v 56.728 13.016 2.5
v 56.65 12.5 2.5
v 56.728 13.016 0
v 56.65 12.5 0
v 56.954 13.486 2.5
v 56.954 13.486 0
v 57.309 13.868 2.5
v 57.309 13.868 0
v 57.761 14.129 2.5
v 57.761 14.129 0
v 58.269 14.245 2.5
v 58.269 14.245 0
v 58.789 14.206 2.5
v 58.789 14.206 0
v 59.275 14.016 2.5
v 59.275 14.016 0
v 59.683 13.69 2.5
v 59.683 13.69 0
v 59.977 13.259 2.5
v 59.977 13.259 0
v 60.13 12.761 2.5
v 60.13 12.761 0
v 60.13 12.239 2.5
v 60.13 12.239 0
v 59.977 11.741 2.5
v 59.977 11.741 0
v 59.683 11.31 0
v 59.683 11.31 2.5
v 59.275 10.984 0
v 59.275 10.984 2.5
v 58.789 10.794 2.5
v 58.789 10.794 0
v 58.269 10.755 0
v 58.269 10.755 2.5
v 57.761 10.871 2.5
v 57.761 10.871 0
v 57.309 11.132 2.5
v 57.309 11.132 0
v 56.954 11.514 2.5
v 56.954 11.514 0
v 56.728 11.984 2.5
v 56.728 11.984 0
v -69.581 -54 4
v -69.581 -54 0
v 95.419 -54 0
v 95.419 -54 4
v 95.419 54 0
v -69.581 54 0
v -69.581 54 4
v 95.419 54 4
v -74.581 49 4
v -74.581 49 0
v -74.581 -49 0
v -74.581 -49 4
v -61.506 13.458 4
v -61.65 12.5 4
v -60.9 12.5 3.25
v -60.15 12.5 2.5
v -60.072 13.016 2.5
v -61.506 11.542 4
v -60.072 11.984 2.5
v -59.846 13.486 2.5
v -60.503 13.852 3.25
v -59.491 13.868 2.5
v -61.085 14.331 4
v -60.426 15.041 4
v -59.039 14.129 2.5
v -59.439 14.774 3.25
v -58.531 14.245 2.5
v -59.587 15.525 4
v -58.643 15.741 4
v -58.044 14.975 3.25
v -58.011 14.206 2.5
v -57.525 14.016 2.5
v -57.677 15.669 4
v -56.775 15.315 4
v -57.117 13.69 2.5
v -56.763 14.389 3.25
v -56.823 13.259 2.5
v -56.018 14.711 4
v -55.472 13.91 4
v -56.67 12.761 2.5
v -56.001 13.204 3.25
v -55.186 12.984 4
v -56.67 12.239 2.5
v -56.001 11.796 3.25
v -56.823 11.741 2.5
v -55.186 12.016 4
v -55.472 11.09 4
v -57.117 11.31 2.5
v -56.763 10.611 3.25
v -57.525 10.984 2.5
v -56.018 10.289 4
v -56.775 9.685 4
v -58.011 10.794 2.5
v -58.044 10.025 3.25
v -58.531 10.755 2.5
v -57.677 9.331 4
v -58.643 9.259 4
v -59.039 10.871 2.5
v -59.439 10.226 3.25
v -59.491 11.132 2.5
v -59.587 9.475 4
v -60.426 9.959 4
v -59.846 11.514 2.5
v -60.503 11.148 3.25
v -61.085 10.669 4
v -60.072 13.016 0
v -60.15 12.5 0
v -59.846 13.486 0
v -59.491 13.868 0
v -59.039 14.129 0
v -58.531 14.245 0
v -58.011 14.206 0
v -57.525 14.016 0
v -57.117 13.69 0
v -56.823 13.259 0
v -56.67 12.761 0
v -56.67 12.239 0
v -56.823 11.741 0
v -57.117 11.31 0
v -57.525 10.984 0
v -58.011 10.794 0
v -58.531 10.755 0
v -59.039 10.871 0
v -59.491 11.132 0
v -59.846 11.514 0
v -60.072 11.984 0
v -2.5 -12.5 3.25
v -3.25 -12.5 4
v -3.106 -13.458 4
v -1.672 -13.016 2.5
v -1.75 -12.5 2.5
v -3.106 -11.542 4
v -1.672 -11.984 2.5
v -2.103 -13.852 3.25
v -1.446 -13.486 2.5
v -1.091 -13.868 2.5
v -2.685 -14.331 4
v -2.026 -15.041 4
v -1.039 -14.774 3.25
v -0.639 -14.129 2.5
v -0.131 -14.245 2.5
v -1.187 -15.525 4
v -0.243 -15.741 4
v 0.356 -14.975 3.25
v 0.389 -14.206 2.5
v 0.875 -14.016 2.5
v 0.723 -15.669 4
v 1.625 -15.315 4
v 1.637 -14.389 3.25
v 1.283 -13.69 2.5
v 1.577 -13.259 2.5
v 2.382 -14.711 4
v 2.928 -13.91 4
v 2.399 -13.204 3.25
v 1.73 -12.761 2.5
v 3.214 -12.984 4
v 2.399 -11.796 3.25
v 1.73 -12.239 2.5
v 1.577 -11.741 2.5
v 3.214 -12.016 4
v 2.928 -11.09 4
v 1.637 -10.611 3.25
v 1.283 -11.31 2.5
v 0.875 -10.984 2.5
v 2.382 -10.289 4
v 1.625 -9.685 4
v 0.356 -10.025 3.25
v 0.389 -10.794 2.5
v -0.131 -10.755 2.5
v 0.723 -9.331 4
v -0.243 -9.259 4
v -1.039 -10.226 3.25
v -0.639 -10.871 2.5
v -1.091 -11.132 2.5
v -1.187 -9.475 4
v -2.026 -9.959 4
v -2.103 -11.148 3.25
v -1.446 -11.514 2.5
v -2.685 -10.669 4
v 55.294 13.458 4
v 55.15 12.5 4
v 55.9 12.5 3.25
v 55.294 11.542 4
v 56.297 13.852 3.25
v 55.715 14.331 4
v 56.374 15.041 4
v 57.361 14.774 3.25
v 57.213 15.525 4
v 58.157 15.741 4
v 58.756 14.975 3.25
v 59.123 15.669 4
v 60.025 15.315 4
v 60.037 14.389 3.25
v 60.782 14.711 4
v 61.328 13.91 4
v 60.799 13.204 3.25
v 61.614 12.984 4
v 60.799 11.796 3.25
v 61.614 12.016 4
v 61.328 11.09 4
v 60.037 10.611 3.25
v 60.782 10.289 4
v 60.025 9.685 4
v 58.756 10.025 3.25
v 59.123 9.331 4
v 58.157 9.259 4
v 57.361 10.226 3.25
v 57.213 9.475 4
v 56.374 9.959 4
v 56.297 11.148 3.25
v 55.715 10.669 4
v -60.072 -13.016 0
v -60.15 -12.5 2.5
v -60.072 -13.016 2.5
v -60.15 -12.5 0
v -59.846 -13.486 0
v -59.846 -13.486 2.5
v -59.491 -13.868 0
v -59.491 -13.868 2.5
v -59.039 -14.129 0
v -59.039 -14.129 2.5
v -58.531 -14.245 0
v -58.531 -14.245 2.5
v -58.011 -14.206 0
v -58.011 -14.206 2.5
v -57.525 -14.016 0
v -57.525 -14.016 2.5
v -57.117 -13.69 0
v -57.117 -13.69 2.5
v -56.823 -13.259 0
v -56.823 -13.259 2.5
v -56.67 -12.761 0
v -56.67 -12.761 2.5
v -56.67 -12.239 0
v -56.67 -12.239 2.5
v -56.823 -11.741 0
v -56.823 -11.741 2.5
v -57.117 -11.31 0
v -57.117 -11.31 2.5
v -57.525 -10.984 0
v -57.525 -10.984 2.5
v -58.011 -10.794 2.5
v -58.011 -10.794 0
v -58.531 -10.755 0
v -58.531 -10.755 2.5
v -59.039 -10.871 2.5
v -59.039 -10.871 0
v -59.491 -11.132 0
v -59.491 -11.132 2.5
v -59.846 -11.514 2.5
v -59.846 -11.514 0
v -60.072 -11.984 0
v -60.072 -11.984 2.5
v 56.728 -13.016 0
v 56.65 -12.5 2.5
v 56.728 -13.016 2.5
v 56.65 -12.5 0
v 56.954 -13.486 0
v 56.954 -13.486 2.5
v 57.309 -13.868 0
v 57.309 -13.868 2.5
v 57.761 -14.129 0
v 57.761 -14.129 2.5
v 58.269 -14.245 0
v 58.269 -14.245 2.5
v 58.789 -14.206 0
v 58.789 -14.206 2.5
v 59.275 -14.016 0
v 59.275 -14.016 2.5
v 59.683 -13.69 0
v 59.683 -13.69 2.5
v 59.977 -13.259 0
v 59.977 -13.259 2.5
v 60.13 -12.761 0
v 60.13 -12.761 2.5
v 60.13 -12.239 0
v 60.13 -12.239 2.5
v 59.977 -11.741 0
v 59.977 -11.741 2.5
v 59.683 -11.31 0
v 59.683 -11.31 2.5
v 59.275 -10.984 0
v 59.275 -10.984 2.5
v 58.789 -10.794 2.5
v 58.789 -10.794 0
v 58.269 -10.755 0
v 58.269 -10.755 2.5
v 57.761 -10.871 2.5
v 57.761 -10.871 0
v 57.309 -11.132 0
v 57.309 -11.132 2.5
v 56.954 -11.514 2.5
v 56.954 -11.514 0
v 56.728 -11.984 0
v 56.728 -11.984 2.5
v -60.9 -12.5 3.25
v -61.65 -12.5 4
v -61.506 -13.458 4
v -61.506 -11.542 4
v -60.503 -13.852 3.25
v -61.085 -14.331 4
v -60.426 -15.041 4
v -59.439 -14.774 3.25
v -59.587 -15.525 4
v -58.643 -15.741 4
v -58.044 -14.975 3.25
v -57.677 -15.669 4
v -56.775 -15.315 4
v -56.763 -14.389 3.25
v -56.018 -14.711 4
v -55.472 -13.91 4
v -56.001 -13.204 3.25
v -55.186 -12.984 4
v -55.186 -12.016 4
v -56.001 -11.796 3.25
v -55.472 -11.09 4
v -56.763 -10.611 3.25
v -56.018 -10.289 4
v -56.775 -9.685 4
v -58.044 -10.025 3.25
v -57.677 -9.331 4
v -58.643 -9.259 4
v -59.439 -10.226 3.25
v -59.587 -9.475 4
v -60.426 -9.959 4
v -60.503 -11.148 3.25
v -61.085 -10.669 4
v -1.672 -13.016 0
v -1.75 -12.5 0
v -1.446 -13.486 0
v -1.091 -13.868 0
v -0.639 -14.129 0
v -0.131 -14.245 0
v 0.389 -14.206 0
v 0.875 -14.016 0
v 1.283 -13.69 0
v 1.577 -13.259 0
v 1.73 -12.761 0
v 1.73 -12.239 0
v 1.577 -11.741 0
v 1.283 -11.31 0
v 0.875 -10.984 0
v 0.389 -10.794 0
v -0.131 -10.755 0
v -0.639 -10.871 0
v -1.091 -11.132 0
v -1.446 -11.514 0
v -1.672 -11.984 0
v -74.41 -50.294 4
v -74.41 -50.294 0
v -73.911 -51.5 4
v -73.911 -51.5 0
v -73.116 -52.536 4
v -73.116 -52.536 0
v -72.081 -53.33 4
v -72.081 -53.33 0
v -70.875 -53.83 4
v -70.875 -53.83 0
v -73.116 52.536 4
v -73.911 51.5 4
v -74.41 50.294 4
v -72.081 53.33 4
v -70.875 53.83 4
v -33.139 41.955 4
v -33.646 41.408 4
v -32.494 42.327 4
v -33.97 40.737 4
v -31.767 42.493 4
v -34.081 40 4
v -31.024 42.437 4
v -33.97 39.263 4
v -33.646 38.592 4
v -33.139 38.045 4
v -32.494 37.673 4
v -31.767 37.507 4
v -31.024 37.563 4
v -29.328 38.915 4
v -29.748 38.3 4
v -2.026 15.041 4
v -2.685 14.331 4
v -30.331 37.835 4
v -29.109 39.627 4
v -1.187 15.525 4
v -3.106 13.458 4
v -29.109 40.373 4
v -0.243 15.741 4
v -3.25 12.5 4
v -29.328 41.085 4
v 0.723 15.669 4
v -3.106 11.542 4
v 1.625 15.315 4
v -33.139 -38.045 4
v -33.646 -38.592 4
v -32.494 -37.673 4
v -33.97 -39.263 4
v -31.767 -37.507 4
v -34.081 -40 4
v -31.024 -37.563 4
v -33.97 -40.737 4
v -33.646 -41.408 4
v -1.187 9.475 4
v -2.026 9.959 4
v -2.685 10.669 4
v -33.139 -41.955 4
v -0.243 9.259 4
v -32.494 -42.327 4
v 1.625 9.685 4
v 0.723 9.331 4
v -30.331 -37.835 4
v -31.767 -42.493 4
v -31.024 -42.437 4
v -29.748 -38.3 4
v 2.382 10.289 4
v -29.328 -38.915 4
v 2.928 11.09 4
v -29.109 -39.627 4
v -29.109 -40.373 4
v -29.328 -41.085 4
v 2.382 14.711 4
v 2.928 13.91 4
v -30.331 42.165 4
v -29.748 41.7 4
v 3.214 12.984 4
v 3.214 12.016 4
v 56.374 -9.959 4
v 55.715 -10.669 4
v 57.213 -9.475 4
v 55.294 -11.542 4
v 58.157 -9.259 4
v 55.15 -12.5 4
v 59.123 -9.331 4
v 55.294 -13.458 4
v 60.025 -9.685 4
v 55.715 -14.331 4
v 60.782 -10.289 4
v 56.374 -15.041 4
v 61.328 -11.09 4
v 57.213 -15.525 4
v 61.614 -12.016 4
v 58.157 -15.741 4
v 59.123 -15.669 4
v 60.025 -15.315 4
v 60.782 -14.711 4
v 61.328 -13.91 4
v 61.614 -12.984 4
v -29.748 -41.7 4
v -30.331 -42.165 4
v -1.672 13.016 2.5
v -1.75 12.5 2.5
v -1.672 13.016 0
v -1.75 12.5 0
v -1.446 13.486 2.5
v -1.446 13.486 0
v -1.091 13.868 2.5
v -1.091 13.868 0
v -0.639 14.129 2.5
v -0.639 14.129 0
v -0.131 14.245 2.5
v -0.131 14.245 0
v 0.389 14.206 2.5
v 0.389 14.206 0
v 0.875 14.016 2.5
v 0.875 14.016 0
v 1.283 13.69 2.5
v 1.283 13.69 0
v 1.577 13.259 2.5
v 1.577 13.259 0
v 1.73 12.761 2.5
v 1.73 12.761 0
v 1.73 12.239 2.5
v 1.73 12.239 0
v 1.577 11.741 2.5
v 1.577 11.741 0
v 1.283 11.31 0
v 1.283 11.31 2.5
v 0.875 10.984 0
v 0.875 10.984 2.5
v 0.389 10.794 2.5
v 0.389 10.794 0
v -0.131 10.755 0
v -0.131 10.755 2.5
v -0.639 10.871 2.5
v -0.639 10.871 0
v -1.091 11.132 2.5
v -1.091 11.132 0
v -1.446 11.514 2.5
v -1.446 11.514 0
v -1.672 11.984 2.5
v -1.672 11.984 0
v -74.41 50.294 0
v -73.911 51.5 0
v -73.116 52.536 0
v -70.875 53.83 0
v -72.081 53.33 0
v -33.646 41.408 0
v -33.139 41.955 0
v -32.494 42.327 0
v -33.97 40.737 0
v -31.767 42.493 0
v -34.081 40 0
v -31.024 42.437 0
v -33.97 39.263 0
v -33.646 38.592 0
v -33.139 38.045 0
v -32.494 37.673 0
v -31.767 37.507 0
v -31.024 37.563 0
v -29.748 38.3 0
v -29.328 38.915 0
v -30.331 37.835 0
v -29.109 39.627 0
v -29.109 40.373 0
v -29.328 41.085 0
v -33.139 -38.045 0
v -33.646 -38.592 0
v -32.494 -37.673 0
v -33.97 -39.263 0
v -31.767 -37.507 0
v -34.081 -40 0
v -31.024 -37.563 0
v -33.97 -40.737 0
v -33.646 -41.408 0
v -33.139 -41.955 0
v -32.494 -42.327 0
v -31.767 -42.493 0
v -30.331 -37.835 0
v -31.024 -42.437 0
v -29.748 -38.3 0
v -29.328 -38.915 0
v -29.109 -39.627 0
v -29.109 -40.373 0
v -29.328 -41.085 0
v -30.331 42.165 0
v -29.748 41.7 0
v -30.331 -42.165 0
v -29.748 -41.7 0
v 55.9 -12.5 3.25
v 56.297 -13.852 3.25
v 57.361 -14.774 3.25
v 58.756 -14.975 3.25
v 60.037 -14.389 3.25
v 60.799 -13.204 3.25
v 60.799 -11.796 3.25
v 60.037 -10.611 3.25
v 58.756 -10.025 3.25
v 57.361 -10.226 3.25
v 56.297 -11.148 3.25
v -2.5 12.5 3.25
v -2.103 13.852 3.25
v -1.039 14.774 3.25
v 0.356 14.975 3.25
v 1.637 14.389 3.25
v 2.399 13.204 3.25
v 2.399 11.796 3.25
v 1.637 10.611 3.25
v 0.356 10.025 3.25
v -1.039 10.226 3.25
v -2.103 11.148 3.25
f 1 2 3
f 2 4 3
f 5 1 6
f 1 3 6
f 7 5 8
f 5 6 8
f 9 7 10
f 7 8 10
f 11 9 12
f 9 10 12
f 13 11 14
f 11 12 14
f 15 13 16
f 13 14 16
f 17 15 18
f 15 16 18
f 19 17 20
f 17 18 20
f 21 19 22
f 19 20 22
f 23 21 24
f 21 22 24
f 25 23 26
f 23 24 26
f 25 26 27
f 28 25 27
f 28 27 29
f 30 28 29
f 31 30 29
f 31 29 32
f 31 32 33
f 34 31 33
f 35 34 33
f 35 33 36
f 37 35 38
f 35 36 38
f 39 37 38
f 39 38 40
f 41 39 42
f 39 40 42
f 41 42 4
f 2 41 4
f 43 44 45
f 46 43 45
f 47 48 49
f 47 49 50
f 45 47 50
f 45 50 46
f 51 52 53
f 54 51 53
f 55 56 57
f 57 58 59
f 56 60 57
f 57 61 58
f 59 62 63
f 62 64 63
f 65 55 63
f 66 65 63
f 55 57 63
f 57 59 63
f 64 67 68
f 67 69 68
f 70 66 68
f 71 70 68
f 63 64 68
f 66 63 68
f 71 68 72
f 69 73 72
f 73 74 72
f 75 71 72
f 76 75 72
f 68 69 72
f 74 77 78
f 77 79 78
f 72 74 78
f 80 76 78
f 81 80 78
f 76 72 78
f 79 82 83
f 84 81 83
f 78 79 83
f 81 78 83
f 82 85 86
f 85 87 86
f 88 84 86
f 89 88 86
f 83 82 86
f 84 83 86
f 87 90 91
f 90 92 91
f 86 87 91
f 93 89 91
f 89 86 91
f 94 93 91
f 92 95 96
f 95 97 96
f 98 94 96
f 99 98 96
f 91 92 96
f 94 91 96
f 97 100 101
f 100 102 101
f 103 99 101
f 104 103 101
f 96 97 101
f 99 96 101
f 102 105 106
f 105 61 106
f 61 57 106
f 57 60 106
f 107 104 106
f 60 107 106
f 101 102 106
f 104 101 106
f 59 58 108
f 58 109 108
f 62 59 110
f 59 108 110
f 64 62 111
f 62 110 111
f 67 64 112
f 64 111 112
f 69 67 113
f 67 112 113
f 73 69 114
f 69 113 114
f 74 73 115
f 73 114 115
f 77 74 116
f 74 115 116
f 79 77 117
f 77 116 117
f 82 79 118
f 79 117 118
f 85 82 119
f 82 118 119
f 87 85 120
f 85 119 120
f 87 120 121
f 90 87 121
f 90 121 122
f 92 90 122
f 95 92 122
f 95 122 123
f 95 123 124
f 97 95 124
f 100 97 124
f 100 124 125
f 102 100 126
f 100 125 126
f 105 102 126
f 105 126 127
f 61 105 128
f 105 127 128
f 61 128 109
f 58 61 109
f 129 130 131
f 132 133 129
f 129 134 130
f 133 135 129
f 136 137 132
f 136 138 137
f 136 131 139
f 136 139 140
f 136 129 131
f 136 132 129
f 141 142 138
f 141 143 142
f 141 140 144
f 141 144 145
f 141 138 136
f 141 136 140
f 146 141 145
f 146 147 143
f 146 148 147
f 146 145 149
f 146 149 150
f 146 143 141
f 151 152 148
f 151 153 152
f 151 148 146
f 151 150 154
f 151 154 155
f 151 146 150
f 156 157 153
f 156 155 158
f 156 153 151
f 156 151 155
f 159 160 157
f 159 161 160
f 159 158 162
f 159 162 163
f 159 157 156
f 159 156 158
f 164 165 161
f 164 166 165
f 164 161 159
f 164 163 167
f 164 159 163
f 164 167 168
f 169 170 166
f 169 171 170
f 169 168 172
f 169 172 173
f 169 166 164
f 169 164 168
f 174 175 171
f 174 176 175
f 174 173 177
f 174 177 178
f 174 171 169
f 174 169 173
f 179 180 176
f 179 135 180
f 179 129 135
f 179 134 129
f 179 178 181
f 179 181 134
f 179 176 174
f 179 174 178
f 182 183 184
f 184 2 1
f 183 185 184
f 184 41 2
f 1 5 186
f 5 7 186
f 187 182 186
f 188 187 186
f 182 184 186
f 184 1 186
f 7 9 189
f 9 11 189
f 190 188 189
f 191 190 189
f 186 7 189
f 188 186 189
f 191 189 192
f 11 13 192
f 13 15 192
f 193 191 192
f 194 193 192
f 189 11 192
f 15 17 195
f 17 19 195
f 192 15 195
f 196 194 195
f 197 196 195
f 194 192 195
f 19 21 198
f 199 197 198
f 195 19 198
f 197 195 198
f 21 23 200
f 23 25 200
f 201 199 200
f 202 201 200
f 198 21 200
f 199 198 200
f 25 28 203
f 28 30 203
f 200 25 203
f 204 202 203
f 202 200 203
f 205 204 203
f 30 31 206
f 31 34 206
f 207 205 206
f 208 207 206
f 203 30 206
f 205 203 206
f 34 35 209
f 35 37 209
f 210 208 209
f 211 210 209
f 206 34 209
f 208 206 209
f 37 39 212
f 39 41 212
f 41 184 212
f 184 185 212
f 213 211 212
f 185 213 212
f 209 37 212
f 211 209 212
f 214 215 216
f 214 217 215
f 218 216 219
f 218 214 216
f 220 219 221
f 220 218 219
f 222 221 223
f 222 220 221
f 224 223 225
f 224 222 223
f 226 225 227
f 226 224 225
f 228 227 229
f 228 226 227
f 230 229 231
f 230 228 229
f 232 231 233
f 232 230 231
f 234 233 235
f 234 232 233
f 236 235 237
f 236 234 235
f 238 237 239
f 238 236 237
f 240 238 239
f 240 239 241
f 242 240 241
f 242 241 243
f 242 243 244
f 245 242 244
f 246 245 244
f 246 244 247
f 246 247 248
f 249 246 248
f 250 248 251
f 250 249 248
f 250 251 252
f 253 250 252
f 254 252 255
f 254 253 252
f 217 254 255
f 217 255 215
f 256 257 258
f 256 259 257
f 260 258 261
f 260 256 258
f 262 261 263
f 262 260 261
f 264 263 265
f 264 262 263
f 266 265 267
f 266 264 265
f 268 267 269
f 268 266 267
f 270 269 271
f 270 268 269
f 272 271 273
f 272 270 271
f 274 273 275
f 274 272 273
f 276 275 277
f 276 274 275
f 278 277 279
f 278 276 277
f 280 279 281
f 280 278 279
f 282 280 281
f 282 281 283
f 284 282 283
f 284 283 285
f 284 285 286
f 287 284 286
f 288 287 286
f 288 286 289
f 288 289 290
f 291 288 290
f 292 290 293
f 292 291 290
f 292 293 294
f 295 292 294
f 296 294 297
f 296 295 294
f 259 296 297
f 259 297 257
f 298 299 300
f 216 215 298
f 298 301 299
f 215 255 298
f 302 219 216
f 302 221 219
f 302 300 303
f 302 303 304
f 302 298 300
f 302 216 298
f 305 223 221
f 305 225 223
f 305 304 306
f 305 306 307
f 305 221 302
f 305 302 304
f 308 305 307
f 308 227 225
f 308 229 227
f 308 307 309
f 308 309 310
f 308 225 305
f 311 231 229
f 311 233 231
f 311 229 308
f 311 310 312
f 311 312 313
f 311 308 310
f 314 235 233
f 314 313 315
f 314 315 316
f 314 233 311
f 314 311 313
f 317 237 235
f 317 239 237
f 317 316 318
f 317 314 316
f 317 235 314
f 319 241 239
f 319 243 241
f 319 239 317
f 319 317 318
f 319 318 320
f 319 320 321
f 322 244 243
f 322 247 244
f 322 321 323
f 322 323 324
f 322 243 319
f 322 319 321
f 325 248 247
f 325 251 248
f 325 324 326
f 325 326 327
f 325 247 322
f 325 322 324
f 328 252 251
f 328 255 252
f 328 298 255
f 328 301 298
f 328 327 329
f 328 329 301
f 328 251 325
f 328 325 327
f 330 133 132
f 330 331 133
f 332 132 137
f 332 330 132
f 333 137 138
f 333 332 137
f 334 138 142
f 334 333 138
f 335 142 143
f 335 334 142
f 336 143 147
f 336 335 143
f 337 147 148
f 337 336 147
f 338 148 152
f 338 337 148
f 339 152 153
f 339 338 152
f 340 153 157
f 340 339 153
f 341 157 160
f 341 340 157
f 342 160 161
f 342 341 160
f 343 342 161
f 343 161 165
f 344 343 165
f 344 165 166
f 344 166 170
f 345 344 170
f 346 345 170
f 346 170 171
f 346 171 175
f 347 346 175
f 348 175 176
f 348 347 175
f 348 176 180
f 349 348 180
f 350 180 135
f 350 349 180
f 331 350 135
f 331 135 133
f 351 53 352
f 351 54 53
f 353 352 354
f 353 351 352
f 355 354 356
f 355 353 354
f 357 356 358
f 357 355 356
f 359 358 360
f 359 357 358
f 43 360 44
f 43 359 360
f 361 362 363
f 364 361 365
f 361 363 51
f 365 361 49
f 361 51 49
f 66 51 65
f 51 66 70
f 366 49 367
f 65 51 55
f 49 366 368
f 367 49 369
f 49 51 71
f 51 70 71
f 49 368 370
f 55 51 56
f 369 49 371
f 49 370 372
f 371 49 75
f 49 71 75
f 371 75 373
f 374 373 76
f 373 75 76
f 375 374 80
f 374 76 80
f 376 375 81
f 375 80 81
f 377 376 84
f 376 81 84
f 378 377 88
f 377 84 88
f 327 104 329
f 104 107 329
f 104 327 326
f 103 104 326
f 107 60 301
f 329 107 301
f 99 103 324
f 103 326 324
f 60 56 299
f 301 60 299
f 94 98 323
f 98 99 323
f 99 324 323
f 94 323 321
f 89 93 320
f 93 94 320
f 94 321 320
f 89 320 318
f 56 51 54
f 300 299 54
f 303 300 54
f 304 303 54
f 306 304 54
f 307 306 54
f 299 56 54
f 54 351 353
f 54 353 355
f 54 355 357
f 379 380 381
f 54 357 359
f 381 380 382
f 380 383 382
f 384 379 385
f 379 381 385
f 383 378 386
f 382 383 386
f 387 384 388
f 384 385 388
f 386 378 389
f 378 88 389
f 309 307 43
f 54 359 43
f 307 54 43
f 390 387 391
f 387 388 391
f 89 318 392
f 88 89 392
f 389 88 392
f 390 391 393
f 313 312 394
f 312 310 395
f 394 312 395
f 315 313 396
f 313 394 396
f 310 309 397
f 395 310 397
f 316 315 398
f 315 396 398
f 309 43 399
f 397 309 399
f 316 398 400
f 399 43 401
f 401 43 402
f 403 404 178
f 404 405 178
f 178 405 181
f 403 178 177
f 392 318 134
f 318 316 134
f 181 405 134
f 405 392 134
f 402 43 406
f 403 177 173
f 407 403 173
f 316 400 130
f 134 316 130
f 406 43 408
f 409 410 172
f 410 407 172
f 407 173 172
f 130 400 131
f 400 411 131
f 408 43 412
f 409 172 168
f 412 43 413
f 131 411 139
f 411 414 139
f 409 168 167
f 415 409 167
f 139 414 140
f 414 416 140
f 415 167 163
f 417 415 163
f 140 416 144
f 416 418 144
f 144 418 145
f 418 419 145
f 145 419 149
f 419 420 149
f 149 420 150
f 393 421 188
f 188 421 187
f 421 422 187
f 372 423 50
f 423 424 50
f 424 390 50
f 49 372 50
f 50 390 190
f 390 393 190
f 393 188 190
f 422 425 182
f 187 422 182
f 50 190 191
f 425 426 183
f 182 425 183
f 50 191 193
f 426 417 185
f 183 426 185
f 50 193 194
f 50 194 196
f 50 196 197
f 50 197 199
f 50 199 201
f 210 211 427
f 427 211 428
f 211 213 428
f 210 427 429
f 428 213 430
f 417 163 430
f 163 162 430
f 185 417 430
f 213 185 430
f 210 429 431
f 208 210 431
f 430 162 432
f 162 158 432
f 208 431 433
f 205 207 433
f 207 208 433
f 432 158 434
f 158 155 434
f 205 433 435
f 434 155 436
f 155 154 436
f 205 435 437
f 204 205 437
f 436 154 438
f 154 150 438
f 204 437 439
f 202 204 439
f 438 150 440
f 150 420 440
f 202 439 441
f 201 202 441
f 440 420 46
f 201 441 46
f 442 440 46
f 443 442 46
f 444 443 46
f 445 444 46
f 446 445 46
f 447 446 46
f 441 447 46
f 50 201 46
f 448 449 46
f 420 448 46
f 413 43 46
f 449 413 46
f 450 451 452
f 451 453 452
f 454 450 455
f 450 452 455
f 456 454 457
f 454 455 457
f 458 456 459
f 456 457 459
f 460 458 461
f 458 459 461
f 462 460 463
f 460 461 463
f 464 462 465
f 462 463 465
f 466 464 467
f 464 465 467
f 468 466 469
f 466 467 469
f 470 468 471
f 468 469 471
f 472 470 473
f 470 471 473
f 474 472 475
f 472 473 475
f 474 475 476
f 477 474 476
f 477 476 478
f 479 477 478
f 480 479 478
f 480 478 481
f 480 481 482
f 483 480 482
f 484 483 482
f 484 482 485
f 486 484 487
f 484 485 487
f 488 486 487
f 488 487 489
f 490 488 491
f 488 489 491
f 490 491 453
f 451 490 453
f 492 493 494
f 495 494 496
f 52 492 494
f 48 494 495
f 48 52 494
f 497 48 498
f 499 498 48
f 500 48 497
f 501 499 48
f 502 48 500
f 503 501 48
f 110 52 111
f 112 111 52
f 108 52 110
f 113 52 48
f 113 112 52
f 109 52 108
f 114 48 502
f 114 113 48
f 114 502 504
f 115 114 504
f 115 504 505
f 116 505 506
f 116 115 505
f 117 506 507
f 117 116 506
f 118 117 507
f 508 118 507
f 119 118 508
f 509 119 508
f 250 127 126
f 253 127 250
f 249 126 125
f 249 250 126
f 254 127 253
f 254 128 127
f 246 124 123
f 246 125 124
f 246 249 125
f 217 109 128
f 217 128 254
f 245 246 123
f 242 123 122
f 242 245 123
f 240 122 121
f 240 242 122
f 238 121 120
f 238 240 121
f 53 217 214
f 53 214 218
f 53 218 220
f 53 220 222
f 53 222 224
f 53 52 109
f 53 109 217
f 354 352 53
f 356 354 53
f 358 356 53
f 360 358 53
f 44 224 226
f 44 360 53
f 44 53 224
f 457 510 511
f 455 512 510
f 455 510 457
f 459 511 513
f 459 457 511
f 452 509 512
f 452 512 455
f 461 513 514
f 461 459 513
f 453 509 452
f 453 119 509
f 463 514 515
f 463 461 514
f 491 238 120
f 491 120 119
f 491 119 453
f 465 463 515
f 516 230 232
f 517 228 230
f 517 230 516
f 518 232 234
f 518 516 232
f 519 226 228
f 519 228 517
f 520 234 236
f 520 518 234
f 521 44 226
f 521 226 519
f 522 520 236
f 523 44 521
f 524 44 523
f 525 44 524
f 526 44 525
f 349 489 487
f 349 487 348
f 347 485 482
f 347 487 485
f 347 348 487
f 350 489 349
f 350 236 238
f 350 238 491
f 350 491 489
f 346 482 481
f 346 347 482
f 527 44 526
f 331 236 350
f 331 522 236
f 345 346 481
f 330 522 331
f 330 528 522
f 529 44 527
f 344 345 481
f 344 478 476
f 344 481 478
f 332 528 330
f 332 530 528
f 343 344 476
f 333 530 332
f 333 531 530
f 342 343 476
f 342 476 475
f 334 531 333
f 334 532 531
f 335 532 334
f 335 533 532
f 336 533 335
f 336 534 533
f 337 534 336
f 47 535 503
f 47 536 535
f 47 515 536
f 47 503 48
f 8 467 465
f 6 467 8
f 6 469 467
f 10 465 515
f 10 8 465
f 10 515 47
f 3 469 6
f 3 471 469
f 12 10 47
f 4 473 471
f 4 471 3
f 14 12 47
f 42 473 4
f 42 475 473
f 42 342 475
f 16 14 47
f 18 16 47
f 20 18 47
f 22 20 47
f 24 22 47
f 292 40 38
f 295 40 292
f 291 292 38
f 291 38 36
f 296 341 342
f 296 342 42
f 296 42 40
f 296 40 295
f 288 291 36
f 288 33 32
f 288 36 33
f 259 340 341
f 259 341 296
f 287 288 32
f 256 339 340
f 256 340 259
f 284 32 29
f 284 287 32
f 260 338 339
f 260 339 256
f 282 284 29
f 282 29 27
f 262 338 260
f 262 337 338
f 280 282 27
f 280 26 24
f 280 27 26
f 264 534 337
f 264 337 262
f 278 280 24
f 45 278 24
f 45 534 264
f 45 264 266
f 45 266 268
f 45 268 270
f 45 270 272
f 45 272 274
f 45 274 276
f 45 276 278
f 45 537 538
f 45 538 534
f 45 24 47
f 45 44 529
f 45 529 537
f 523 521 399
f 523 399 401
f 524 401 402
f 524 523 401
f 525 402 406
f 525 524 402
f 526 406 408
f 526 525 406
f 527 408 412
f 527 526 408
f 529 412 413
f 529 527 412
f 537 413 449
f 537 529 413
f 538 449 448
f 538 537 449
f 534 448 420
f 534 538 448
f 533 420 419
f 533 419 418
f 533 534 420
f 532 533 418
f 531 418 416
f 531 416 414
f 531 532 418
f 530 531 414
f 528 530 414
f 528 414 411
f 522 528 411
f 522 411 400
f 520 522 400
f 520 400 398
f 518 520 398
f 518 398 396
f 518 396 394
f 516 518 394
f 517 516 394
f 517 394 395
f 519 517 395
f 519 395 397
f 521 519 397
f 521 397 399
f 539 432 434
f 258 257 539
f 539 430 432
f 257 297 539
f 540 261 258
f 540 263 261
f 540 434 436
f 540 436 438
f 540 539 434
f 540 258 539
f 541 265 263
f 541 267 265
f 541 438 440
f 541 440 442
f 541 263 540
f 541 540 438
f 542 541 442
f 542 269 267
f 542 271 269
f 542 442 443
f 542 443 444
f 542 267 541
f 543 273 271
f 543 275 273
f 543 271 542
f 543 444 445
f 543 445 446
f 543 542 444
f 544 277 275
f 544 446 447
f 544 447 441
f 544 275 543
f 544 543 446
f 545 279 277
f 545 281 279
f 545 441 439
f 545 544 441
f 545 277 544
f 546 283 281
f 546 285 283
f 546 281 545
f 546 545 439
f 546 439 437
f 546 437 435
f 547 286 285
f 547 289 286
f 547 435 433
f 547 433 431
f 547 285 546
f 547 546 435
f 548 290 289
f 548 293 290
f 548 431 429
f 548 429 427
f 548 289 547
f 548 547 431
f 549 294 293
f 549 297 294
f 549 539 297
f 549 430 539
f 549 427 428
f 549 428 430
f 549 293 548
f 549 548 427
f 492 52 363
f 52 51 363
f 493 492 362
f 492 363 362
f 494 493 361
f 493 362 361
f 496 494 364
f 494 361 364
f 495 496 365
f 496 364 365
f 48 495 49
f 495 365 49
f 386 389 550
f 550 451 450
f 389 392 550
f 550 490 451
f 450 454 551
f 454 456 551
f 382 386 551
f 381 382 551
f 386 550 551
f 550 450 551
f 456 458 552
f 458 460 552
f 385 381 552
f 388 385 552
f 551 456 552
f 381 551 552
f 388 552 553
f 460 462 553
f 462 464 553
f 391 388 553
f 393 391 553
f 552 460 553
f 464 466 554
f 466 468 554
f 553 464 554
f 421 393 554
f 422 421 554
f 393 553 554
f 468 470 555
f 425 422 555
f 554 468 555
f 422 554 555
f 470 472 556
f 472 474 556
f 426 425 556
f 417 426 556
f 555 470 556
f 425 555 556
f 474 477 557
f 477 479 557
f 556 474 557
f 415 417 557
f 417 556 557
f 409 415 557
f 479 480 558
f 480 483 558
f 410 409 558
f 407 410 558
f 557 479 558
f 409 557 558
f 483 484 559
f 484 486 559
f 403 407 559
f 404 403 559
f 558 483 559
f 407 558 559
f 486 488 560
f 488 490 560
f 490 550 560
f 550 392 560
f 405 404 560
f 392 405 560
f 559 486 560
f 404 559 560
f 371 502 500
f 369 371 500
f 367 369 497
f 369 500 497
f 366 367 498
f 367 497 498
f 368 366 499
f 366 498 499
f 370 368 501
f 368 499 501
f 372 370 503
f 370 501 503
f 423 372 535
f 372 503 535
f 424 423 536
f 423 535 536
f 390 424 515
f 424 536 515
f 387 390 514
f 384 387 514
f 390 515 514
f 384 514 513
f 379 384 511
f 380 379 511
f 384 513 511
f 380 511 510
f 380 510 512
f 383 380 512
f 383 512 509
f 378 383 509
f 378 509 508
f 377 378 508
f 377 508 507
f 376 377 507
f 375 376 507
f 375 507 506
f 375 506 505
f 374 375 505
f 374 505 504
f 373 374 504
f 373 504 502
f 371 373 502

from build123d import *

# Parameters (mm, degrees)
F0_W           = 170
F0_H           = 54
F1_DEPTH       = 4
F3_D           = 5
F4_D           = 3.5
F4_CSINK_D     = 6.5
F4_CSINK_ANGLE = 90
F6_R           = 5


with BuildPart() as f1:
    # F0 (on Top) → F1 (new body)
    with BuildSketch(Plane.XY):
        with Locations((10.4193558595, 27)):
            Rectangle(F0_W, F0_H)
    extrude(amount=F1_DEPTH)

    # F3 (through all)
    with Locations(Plane.XY.offset(4)):
        with Locations((-31.5806441405, 40)):
            Hole(F3_D / 2)

    # F4 (through all)
    with Locations(Plane.XY.offset(4)):
        with Locations((-58.4, 12.5), (0, 12.5), (58.4, 12.5)):
            CounterSinkHole(F4_D / 2, F4_CSINK_D / 2, counter_sink_angle=F4_CSINK_ANGLE)

    # F5: F1 across face


with BuildPart() as f1_1:
    add(f1.part)
    add(f1.part.mirror(Plane(origin=(10.4193558595, 0, 2), x_dir=(1, 0, 0), z_dir=(0, -1, 0))))

    # F6
    f6_edges = [f1_1.edges().sort_by_distance(p)[0] for p in [
        (-74.580644, 54, 2),
        (-74.580644, -54, 2),
    ]]
    fillet(f6_edges, radius=F6_R)


solid = f1_1.part
